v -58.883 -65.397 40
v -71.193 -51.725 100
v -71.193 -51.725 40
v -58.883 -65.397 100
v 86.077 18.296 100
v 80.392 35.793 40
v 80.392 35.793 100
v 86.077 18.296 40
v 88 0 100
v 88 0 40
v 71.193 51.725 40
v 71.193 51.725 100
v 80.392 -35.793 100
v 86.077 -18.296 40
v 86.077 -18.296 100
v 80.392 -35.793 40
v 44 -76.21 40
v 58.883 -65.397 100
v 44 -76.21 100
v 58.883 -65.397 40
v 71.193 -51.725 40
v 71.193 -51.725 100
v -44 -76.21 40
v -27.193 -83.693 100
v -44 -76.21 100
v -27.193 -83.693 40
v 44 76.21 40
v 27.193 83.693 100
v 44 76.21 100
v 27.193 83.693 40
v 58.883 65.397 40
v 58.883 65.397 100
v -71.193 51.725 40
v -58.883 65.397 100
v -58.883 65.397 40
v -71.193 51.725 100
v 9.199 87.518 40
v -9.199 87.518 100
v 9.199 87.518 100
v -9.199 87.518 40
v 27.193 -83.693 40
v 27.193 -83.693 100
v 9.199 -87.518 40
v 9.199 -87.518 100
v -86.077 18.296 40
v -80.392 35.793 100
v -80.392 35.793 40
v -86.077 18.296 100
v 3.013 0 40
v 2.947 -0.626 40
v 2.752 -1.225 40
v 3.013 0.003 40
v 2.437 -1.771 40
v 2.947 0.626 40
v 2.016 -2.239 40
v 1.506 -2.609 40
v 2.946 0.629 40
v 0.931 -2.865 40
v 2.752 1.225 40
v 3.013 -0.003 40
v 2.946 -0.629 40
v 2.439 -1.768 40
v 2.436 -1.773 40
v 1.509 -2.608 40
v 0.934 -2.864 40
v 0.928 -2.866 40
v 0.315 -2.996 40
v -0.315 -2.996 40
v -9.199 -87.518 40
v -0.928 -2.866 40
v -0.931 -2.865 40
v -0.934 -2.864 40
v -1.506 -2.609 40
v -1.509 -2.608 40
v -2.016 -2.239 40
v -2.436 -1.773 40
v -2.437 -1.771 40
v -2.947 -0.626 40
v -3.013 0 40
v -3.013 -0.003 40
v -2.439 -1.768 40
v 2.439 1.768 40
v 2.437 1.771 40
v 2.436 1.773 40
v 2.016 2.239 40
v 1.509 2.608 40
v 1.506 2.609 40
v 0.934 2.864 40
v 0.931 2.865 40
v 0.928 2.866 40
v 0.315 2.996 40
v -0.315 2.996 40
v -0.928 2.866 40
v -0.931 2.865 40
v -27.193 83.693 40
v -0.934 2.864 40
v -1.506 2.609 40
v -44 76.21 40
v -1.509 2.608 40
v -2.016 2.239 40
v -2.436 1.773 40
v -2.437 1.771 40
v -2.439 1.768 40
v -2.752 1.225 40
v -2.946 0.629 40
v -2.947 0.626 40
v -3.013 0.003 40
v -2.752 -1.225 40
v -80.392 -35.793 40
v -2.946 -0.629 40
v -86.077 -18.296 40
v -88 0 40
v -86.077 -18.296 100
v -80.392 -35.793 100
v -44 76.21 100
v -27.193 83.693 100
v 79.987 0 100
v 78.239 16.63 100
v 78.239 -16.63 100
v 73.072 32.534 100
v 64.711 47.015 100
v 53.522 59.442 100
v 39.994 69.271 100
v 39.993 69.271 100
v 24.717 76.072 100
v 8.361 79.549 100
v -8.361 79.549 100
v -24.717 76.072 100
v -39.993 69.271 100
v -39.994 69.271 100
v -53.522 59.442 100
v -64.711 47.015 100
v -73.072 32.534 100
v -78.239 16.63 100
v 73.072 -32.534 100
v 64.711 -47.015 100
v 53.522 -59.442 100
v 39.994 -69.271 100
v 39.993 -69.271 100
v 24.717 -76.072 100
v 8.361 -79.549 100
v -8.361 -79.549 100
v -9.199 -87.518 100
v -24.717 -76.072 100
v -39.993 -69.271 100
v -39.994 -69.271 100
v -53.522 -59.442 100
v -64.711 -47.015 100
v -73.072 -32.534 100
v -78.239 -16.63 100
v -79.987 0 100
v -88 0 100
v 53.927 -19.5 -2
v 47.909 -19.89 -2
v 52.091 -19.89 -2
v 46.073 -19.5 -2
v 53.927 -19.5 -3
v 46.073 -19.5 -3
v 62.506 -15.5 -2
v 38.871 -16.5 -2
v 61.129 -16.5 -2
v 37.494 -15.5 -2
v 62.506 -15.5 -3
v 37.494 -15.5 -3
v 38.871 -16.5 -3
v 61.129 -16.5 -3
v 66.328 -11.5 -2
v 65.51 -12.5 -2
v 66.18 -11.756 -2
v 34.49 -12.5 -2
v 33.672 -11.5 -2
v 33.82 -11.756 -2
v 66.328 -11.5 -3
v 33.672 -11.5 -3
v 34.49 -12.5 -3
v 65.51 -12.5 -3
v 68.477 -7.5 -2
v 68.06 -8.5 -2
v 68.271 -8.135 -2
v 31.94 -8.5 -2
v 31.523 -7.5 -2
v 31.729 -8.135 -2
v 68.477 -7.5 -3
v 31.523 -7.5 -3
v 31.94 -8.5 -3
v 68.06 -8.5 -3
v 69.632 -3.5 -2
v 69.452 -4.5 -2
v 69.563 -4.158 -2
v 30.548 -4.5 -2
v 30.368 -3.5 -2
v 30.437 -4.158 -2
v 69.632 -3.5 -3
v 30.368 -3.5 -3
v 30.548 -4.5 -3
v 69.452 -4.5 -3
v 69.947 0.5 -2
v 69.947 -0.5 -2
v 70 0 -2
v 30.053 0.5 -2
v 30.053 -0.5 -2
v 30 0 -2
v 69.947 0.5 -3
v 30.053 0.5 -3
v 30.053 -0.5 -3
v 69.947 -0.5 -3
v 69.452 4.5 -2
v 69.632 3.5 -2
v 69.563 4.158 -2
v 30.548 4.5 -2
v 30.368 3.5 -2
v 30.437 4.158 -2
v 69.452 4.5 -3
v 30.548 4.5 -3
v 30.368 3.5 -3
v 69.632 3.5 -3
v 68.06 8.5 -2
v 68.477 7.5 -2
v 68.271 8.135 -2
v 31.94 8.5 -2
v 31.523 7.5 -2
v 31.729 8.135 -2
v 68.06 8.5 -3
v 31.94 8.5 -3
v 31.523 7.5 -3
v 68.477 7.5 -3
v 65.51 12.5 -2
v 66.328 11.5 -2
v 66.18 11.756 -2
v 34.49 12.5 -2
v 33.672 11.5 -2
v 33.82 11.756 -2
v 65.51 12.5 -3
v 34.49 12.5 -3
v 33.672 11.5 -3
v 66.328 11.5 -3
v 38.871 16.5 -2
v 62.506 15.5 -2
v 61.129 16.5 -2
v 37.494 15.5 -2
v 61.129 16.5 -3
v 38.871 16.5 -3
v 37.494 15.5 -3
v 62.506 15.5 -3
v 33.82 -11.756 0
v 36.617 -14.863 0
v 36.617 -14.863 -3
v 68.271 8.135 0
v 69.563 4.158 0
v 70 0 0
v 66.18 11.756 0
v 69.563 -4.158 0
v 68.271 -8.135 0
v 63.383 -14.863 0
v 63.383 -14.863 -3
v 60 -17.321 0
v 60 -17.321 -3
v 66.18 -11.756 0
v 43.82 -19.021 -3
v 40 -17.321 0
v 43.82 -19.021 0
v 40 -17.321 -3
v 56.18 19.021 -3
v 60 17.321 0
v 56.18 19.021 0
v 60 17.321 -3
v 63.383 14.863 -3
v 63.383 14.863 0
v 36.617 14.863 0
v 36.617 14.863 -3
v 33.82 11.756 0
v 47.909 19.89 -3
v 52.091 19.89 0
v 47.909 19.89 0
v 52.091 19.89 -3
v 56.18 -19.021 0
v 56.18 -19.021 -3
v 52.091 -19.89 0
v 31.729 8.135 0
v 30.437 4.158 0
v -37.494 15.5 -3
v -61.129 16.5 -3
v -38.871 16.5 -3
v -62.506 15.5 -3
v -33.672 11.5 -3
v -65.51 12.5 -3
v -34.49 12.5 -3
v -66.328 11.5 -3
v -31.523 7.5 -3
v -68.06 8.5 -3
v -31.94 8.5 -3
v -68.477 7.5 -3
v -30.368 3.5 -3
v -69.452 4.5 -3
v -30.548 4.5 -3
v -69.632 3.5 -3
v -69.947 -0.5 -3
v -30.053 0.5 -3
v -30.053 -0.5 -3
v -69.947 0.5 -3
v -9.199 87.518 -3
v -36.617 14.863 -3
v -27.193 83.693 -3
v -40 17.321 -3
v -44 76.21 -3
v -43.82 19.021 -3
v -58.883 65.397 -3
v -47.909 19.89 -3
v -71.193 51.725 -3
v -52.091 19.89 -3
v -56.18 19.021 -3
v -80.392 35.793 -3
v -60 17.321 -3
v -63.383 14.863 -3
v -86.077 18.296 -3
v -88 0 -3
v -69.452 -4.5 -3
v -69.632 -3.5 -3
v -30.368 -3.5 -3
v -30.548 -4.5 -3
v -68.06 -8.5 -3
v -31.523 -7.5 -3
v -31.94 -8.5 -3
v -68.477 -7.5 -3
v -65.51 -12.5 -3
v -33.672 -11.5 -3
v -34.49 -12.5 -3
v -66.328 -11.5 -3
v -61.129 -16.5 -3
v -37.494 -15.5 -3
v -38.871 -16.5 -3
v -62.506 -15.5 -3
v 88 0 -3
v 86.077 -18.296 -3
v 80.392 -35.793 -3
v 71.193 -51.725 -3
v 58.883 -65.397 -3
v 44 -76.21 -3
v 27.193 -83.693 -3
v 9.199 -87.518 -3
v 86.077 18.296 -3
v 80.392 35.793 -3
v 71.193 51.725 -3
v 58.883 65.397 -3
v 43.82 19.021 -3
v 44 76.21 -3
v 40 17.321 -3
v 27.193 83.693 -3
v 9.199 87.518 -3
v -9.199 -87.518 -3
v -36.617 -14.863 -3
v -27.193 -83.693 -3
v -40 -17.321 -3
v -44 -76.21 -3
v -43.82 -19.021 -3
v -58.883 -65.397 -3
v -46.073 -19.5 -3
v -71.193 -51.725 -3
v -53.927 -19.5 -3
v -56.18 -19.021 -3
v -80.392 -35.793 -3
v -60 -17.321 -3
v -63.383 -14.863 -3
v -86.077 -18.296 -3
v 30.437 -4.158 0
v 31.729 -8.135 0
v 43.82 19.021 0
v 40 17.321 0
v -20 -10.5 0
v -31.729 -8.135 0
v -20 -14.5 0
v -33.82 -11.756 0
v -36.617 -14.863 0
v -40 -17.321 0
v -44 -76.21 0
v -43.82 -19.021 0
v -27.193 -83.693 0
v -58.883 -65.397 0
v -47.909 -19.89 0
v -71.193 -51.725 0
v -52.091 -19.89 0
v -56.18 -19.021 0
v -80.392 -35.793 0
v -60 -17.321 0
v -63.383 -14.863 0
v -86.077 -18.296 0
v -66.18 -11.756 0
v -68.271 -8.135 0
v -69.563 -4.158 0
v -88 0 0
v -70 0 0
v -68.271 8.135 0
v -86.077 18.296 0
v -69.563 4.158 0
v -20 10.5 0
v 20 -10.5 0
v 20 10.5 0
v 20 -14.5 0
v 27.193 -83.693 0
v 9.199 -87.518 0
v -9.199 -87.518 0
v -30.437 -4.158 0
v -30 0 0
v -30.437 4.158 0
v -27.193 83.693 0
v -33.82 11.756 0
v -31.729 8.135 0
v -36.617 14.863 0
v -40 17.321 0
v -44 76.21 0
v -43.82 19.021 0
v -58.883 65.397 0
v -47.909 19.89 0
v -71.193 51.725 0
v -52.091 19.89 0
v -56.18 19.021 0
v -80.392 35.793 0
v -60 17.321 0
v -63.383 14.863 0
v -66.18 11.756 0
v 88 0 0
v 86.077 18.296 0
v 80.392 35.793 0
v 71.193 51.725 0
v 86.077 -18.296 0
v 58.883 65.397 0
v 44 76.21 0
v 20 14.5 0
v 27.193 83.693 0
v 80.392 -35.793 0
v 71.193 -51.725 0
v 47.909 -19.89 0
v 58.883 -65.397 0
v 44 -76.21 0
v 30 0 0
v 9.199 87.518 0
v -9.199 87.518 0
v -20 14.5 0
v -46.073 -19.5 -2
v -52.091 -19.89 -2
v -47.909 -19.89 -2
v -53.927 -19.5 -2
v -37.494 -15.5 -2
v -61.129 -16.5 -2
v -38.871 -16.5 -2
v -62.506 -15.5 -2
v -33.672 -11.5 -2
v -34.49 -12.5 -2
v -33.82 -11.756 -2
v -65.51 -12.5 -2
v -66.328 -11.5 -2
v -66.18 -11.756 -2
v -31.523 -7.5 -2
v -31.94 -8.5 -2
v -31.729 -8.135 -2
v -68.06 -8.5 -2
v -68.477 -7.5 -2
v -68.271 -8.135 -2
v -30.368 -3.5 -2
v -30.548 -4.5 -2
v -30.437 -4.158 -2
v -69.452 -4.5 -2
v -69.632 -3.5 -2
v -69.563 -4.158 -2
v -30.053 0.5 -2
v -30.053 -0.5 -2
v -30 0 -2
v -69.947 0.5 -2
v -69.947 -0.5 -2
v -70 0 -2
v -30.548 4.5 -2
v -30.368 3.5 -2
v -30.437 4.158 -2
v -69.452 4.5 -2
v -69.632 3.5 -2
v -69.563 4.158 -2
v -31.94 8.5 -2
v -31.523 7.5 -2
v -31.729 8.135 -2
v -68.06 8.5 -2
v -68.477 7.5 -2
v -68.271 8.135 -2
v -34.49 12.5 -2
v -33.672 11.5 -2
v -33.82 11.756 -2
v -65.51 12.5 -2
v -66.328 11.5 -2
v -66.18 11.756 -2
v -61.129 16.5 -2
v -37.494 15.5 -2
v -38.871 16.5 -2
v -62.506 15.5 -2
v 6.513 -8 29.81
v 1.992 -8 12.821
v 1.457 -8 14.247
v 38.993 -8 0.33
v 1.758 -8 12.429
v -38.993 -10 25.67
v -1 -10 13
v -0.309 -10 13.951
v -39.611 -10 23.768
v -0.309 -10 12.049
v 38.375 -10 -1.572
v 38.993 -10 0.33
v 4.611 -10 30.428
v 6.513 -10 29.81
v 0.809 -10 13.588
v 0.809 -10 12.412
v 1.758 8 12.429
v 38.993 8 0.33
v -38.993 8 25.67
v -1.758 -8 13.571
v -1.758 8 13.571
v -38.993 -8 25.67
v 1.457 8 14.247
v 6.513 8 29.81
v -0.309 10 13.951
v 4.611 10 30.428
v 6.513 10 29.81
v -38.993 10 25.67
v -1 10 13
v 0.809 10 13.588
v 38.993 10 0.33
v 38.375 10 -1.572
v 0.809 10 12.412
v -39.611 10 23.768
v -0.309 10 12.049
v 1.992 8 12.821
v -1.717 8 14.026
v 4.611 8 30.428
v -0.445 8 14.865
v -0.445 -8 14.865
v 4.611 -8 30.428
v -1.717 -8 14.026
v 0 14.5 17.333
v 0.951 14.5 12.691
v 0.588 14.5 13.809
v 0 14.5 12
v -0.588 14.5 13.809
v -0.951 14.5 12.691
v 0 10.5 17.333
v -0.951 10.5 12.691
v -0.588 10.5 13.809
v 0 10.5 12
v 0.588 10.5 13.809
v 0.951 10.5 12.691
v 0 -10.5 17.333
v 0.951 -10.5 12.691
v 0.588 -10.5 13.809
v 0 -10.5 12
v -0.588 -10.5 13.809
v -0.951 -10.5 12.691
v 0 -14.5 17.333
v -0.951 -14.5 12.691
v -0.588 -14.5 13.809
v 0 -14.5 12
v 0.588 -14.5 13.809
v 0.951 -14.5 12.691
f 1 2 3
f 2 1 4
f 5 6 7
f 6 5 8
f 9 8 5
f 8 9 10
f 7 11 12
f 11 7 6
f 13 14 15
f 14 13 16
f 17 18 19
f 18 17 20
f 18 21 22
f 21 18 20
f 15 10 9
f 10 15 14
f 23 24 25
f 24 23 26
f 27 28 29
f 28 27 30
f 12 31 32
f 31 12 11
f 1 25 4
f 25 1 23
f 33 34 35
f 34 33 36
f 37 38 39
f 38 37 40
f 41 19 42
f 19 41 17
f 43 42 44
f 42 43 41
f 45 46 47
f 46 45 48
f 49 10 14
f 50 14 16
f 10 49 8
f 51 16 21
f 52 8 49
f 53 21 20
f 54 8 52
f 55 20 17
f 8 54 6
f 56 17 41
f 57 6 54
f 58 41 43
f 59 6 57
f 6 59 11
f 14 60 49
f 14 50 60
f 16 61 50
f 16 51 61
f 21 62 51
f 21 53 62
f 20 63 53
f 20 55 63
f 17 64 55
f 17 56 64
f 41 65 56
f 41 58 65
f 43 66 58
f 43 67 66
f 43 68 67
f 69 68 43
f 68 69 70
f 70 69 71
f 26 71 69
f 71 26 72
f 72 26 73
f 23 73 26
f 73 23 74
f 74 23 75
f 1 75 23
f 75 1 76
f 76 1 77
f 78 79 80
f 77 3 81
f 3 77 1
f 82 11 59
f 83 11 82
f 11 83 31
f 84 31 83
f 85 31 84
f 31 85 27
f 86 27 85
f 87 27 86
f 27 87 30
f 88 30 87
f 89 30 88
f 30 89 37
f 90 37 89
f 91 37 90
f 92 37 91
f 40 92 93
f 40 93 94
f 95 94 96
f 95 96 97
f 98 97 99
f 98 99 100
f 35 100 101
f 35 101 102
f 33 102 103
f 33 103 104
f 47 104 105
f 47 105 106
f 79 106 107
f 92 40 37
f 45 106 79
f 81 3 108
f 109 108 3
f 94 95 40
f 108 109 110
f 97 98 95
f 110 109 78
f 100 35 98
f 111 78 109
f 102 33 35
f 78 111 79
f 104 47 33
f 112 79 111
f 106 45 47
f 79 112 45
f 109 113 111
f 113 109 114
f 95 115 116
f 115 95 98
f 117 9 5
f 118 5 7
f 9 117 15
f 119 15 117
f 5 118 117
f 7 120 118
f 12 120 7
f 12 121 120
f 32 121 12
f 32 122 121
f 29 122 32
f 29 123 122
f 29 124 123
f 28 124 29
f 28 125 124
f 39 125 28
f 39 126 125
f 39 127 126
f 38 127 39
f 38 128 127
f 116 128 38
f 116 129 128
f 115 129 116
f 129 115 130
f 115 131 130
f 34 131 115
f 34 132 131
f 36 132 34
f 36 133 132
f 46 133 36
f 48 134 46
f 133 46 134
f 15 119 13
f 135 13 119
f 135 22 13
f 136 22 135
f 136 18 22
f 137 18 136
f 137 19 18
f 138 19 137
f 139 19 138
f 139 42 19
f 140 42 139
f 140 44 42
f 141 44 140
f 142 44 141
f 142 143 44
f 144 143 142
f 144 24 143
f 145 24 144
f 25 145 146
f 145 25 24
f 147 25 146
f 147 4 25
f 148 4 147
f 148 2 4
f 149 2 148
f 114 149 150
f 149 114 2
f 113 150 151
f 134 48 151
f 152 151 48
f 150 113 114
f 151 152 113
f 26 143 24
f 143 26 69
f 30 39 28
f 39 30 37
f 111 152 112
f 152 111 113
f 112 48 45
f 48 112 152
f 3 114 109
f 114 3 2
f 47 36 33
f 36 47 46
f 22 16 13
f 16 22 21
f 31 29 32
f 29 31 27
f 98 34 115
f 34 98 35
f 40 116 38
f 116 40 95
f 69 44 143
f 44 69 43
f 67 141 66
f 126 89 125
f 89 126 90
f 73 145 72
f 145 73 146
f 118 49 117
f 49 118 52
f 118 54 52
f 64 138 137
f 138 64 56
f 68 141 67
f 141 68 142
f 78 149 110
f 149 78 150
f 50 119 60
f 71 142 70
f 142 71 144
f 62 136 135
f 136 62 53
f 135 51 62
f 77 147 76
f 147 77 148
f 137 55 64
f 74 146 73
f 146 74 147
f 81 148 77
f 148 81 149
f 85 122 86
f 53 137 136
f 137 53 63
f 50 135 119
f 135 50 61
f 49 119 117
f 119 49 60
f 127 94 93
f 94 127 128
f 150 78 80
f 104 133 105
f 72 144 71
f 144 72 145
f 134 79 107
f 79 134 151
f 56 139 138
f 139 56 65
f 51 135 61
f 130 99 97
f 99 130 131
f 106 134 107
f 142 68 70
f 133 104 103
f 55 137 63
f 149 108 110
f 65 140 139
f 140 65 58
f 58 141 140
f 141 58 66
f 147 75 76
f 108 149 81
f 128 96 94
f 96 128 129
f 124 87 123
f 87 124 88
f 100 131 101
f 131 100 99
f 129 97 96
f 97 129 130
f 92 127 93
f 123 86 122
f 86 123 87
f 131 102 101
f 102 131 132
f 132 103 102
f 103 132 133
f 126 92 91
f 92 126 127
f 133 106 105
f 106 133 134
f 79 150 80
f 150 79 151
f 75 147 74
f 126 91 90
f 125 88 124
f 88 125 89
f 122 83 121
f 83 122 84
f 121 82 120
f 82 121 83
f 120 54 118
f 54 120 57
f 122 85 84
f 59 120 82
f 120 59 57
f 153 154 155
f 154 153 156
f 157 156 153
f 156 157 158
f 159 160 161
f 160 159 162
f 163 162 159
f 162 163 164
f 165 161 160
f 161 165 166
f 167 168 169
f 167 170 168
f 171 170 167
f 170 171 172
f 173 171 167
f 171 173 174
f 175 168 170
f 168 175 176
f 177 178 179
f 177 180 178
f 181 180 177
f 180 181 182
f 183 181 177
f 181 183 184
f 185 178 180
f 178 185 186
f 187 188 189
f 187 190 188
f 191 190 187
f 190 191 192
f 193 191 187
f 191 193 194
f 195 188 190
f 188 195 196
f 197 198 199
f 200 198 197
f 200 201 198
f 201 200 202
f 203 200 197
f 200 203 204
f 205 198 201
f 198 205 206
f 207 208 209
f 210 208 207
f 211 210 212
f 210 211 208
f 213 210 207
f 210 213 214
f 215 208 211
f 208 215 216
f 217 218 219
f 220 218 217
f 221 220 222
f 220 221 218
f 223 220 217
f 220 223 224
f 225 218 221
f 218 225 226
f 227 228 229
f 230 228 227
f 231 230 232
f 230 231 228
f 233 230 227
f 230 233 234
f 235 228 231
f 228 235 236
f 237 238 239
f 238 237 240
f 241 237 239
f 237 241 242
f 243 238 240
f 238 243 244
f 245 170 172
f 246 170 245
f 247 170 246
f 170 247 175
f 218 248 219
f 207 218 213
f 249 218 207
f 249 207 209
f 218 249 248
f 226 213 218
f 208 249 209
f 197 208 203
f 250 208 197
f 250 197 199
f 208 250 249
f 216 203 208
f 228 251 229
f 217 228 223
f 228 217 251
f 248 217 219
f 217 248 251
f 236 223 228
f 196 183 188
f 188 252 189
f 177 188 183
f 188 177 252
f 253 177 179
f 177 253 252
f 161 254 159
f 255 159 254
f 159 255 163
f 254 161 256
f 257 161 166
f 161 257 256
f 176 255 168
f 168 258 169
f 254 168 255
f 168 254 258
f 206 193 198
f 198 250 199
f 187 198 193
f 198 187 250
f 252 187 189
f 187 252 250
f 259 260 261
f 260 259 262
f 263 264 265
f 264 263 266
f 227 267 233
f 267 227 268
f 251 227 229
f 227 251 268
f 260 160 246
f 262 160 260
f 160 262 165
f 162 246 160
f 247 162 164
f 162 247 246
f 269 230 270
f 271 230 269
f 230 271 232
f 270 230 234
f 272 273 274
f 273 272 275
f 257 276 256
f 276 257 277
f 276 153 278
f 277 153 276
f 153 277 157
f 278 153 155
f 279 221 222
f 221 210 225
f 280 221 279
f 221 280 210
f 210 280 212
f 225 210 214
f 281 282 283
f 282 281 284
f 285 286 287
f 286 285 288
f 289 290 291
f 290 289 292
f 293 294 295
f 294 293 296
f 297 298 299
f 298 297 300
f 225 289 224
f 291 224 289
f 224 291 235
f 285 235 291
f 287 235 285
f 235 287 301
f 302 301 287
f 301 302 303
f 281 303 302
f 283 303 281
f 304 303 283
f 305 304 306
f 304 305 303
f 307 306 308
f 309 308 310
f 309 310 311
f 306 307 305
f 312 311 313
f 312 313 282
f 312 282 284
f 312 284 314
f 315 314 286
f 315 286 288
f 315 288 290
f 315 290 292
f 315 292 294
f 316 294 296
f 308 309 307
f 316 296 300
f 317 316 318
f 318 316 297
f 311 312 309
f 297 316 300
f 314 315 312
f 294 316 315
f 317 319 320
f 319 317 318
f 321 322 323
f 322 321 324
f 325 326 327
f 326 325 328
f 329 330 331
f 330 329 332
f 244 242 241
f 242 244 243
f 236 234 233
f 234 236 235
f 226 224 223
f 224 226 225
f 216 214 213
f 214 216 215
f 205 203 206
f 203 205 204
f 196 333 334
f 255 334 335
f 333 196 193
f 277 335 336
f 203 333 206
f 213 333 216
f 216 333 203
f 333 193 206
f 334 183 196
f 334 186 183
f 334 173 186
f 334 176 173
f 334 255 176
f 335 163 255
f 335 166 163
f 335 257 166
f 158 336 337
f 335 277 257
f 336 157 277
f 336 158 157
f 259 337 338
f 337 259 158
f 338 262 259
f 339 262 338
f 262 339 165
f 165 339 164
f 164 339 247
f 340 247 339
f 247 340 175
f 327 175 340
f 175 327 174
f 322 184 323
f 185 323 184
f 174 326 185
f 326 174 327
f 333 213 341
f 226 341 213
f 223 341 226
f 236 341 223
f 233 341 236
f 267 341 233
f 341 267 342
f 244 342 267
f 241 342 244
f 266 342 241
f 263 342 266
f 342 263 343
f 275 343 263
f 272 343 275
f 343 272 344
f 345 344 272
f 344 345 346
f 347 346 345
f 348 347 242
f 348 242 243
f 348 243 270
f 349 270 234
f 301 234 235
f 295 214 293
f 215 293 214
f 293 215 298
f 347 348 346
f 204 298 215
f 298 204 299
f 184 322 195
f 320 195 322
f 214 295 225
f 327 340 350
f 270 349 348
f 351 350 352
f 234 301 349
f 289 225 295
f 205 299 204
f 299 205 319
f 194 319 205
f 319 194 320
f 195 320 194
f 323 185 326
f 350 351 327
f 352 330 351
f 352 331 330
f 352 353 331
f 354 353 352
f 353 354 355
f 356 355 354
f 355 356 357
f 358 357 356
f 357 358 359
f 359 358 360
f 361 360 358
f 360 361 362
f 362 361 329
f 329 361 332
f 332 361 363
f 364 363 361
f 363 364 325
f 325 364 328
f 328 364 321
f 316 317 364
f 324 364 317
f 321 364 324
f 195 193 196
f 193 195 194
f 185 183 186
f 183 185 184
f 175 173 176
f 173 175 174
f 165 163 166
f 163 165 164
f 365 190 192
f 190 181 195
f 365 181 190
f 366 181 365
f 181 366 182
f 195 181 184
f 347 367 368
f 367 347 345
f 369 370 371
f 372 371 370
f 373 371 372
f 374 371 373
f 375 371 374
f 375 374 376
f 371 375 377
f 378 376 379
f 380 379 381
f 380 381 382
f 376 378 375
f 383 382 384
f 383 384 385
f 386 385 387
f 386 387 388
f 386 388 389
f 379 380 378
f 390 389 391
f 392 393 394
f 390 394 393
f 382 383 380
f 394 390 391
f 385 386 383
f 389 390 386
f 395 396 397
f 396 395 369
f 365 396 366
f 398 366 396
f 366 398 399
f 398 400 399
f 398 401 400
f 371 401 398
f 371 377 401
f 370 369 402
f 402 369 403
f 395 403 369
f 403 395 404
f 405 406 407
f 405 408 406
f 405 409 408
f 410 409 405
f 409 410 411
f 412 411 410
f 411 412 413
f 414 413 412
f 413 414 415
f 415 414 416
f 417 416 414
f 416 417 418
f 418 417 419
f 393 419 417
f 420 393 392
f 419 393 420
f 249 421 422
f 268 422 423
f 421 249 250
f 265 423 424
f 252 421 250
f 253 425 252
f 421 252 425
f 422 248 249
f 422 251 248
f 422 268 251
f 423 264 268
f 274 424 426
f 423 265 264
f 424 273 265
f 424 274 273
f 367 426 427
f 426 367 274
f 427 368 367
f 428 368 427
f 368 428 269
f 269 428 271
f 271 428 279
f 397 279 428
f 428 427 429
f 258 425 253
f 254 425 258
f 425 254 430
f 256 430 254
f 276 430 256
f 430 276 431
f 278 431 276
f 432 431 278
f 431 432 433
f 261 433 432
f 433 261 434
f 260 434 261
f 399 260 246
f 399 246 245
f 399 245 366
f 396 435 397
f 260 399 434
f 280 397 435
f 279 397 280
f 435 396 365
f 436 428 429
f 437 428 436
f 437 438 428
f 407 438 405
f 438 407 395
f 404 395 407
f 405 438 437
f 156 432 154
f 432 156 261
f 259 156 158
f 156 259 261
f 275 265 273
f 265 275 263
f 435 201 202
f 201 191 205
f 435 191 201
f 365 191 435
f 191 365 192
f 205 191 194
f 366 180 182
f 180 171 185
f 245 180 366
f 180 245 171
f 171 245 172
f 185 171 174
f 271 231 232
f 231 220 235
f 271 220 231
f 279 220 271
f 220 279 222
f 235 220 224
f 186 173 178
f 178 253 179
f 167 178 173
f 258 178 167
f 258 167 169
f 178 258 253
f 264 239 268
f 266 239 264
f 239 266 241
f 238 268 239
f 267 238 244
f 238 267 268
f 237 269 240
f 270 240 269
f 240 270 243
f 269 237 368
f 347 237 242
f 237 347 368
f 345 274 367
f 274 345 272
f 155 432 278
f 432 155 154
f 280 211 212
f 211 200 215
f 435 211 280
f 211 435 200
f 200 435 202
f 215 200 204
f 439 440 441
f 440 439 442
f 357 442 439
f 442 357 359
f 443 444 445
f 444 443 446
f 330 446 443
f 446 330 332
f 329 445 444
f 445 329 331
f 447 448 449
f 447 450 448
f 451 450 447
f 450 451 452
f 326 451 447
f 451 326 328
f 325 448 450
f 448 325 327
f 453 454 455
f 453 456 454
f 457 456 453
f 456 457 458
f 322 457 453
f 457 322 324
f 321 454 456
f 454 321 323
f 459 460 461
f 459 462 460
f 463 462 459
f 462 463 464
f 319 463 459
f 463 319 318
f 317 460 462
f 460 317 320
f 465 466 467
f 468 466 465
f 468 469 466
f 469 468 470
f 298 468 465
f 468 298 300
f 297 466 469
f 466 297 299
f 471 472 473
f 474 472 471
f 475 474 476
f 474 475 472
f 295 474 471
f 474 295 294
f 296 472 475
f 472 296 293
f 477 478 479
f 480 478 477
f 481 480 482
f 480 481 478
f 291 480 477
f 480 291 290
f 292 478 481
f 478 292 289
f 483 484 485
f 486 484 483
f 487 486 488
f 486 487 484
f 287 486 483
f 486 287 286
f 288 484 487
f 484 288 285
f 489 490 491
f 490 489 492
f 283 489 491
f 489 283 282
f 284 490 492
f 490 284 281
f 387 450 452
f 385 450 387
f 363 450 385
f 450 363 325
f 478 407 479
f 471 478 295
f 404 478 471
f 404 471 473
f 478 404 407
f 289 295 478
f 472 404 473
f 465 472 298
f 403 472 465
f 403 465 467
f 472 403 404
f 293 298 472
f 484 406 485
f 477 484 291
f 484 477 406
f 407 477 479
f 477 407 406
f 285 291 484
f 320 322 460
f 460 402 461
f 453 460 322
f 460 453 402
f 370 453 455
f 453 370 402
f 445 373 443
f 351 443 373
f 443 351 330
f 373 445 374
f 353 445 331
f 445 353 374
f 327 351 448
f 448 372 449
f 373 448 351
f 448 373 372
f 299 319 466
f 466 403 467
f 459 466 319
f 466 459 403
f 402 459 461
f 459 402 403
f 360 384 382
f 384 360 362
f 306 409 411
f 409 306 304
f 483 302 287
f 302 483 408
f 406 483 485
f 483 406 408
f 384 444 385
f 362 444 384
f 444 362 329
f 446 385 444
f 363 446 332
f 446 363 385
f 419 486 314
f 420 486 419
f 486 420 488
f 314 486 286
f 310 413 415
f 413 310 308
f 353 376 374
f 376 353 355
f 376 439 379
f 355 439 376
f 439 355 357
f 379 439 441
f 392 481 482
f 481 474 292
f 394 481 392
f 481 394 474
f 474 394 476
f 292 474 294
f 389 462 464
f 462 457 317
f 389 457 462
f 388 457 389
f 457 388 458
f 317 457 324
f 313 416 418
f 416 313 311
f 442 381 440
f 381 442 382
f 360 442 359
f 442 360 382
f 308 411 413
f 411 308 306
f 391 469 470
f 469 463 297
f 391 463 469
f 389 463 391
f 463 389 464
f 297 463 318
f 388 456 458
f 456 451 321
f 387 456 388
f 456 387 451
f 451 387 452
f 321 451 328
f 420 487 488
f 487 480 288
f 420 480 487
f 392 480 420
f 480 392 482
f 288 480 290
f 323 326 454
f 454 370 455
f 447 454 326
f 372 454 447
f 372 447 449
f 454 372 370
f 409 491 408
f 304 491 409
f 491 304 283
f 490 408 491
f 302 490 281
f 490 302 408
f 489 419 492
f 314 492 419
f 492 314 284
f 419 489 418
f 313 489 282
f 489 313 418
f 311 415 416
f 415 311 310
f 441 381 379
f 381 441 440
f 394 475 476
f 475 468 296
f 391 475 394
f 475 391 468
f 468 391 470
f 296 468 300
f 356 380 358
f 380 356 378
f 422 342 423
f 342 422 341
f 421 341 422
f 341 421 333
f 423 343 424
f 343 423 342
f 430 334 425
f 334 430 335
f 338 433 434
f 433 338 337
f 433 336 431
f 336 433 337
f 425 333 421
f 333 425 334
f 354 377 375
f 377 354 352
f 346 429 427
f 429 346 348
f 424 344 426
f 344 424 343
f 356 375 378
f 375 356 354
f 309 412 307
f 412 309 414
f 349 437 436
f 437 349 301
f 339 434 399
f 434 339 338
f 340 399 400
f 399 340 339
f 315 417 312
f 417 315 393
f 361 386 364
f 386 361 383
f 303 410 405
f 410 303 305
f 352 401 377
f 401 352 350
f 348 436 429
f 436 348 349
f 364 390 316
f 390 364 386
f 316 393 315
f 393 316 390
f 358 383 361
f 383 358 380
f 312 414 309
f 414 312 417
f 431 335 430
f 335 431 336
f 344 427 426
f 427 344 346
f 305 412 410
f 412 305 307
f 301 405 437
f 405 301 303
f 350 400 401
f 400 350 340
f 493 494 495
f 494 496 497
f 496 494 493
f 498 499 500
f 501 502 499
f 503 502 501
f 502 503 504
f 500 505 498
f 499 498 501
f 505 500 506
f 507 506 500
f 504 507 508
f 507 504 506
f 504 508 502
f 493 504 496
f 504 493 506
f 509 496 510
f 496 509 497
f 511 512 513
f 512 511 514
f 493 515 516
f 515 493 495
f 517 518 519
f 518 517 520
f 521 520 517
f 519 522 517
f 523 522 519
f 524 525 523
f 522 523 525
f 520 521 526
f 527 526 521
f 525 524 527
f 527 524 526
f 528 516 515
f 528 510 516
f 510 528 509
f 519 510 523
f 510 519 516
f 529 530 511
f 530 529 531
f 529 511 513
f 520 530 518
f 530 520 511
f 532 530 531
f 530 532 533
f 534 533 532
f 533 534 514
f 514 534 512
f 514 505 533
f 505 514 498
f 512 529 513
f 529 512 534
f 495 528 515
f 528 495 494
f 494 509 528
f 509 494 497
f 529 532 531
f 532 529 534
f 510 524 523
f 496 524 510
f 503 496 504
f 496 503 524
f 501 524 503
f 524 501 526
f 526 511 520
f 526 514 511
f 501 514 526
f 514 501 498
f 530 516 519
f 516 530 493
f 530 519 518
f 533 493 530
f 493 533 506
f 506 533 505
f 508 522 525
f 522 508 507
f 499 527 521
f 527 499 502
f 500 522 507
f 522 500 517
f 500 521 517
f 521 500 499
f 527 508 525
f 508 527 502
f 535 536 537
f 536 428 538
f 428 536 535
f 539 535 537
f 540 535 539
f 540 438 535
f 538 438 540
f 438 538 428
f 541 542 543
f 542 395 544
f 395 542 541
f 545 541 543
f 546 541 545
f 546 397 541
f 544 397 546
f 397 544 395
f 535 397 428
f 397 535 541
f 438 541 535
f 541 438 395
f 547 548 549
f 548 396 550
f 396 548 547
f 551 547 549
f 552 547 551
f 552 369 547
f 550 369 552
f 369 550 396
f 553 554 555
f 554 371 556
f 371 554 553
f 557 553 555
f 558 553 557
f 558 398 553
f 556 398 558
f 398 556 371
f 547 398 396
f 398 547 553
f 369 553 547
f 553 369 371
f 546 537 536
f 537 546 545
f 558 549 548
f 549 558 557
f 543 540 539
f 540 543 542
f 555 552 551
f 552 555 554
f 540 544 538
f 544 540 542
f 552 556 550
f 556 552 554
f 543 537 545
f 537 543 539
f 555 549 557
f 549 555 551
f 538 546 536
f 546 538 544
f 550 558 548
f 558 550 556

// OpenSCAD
ombo_r = 88;

ombo_trychtyr_r1 = ombo_r;
ombo_trychtyr_r2 = 80;
ombo_trychtyr_r3 = 3;
ombo_trychtyr_h = 60;

ombo_clunek_g = 2;  // tloustka sten
ombo_clunek_d1 = 40; // delka jedne strany clunku
ombo_clunek_d2 = ombo_clunek_g; // sirka prostredku
ombo_clunek_h = 19; // vyska clunku (vcetne vysky podlahy)
ombo_clunek_w = 20; // sirka clunku
ombo_clunek_r_diry = 1;

ombo_clunek_d = ombo_clunek_d1 * 2 + ombo_clunek_d2;

ombo_spodek_r_vnejsi = ombo_r;
ombo_spodek_r_vnitrni = 80;
ombo_spodek_h_podlahy = 3;
ombo_spodek_h_clunku = 13; // vyska clunku nad podlahou

module ombo_trychtyr() {
  difference() {
    cylinder(r=ombo_trychtyr_r1, h=ombo_trychtyr_h);
    translate([0, 0, -0.01])
    cylinder(r2=ombo_trychtyr_r2, r1=ombo_trychtyr_r3, h=ombo_trychtyr_h + 0.02);
  }
}
translate([0, 0, 40])
ombo_trychtyr();

// https://cs.wikipedia.org/wiki/Sr%C3%A1%C5%BEkom%C4%9Br#/media/Soubor:Interior_tipping_bucket.JPG
module ombo_clunek() {
  module stena() {
    translate([0, ombo_clunek_g/2, 0]) // kvuli rotaci to neni vycentrovany
      rotate([90, 0, 0]) // exrude to polozi do xy planu, ja to chci nastojato
        linear_extrude(ombo_clunek_g)
          polygon([
            [ombo_clunek_d2/2, ombo_clunek_g/2],
            [ombo_clunek_d2/2, ombo_clunek_h],
            [ombo_clunek_d1 + ombo_clunek_d2/2, ombo_clunek_g/2]
          ]);
  }
  module steny() {
    translate([0, ombo_clunek_g/2-ombo_clunek_w/2, 0])
      stena();
    translate([0, -ombo_clunek_g/2+ombo_clunek_w/2, 0])
      stena();
  }

  translate([0, 0, -ombo_clunek_g/2])
    difference() {
      union() {
        translate([0, 0, ombo_clunek_g/2])
          rotate([0, 90, 90])
            cylinder(r=ombo_clunek_g, h=ombo_clunek_w, center=true);

        cube([ombo_clunek_d, ombo_clunek_w, ombo_clunek_g], center=true);
        translate([0, 0, ombo_clunek_h/2])
          cube([ombo_clunek_d2, ombo_clunek_w, ombo_clunek_h], center=true);

        steny();
        rotate([0, 0, 180])
          steny();
      }
      translate([0, 0, ombo_clunek_g/2])
        rotate([0, 90, 90])
          cylinder(r=ombo_clunek_r_diry, h=2*ombo_clunek_w, center=true);
    }
}
// ombo_clunek();

module ombo_dira() {
  pocet_car = 10;
  difference() {
    cylinder(r=20, h=ombo_spodek_h_podlahy);
    for (i=[0:pocet_car-1]) {
      translate([0, -20+(i/pocet_car*40), 0]) {
        cube([41, 1, 2], center=true);
      }
    }
  }
}

module ombo_spodek() {
  translate([0, 0, -ombo_spodek_h_podlahy])
    difference() {
      cylinder(r=ombo_spodek_r_vnejsi, h=ombo_spodek_h_podlahy);
      translate([50, 0, 0])
        ombo_dira();
      translate([-50, 0, 0])
        ombo_dira();
    }
  translate([0, 0, ombo_spodek_h_clunku])
    rotate([0, 18, 0])
      ombo_clunek();

  // translate([-22, 0, 6])
  //   cube([5, 1.5*ombo_clunek_w, 10], center=true);
  // translate([22, 0, 6])
  //   cube([5, 1.5*ombo_clunek_w, 10], center=true);

  module drzak() {
    a = 20;
    g = 4;
    translate([0, g/2, 0])
    rotate([90, 0, 0])
    linear_extrude(g)
      polygon([
        [-a, 0],
        [a, 0],
        [0, ombo_spodek_h_clunku * 4/3]
      ]);
  }

  difference() {
    union() {
      translate([0, 3/2+ombo_clunek_w/2+1, 0])
        drzak();
      translate([0, -(3/2+ombo_clunek_w/2+1), 0])
        drzak();
    }
    translate([0, 0, ombo_spodek_h_clunku])
      rotate([0, 90, 90])
        cylinder(r=ombo_clunek_r_diry, h=2*ombo_clunek_w, center=true);
  }

}
ombo_spodek();
